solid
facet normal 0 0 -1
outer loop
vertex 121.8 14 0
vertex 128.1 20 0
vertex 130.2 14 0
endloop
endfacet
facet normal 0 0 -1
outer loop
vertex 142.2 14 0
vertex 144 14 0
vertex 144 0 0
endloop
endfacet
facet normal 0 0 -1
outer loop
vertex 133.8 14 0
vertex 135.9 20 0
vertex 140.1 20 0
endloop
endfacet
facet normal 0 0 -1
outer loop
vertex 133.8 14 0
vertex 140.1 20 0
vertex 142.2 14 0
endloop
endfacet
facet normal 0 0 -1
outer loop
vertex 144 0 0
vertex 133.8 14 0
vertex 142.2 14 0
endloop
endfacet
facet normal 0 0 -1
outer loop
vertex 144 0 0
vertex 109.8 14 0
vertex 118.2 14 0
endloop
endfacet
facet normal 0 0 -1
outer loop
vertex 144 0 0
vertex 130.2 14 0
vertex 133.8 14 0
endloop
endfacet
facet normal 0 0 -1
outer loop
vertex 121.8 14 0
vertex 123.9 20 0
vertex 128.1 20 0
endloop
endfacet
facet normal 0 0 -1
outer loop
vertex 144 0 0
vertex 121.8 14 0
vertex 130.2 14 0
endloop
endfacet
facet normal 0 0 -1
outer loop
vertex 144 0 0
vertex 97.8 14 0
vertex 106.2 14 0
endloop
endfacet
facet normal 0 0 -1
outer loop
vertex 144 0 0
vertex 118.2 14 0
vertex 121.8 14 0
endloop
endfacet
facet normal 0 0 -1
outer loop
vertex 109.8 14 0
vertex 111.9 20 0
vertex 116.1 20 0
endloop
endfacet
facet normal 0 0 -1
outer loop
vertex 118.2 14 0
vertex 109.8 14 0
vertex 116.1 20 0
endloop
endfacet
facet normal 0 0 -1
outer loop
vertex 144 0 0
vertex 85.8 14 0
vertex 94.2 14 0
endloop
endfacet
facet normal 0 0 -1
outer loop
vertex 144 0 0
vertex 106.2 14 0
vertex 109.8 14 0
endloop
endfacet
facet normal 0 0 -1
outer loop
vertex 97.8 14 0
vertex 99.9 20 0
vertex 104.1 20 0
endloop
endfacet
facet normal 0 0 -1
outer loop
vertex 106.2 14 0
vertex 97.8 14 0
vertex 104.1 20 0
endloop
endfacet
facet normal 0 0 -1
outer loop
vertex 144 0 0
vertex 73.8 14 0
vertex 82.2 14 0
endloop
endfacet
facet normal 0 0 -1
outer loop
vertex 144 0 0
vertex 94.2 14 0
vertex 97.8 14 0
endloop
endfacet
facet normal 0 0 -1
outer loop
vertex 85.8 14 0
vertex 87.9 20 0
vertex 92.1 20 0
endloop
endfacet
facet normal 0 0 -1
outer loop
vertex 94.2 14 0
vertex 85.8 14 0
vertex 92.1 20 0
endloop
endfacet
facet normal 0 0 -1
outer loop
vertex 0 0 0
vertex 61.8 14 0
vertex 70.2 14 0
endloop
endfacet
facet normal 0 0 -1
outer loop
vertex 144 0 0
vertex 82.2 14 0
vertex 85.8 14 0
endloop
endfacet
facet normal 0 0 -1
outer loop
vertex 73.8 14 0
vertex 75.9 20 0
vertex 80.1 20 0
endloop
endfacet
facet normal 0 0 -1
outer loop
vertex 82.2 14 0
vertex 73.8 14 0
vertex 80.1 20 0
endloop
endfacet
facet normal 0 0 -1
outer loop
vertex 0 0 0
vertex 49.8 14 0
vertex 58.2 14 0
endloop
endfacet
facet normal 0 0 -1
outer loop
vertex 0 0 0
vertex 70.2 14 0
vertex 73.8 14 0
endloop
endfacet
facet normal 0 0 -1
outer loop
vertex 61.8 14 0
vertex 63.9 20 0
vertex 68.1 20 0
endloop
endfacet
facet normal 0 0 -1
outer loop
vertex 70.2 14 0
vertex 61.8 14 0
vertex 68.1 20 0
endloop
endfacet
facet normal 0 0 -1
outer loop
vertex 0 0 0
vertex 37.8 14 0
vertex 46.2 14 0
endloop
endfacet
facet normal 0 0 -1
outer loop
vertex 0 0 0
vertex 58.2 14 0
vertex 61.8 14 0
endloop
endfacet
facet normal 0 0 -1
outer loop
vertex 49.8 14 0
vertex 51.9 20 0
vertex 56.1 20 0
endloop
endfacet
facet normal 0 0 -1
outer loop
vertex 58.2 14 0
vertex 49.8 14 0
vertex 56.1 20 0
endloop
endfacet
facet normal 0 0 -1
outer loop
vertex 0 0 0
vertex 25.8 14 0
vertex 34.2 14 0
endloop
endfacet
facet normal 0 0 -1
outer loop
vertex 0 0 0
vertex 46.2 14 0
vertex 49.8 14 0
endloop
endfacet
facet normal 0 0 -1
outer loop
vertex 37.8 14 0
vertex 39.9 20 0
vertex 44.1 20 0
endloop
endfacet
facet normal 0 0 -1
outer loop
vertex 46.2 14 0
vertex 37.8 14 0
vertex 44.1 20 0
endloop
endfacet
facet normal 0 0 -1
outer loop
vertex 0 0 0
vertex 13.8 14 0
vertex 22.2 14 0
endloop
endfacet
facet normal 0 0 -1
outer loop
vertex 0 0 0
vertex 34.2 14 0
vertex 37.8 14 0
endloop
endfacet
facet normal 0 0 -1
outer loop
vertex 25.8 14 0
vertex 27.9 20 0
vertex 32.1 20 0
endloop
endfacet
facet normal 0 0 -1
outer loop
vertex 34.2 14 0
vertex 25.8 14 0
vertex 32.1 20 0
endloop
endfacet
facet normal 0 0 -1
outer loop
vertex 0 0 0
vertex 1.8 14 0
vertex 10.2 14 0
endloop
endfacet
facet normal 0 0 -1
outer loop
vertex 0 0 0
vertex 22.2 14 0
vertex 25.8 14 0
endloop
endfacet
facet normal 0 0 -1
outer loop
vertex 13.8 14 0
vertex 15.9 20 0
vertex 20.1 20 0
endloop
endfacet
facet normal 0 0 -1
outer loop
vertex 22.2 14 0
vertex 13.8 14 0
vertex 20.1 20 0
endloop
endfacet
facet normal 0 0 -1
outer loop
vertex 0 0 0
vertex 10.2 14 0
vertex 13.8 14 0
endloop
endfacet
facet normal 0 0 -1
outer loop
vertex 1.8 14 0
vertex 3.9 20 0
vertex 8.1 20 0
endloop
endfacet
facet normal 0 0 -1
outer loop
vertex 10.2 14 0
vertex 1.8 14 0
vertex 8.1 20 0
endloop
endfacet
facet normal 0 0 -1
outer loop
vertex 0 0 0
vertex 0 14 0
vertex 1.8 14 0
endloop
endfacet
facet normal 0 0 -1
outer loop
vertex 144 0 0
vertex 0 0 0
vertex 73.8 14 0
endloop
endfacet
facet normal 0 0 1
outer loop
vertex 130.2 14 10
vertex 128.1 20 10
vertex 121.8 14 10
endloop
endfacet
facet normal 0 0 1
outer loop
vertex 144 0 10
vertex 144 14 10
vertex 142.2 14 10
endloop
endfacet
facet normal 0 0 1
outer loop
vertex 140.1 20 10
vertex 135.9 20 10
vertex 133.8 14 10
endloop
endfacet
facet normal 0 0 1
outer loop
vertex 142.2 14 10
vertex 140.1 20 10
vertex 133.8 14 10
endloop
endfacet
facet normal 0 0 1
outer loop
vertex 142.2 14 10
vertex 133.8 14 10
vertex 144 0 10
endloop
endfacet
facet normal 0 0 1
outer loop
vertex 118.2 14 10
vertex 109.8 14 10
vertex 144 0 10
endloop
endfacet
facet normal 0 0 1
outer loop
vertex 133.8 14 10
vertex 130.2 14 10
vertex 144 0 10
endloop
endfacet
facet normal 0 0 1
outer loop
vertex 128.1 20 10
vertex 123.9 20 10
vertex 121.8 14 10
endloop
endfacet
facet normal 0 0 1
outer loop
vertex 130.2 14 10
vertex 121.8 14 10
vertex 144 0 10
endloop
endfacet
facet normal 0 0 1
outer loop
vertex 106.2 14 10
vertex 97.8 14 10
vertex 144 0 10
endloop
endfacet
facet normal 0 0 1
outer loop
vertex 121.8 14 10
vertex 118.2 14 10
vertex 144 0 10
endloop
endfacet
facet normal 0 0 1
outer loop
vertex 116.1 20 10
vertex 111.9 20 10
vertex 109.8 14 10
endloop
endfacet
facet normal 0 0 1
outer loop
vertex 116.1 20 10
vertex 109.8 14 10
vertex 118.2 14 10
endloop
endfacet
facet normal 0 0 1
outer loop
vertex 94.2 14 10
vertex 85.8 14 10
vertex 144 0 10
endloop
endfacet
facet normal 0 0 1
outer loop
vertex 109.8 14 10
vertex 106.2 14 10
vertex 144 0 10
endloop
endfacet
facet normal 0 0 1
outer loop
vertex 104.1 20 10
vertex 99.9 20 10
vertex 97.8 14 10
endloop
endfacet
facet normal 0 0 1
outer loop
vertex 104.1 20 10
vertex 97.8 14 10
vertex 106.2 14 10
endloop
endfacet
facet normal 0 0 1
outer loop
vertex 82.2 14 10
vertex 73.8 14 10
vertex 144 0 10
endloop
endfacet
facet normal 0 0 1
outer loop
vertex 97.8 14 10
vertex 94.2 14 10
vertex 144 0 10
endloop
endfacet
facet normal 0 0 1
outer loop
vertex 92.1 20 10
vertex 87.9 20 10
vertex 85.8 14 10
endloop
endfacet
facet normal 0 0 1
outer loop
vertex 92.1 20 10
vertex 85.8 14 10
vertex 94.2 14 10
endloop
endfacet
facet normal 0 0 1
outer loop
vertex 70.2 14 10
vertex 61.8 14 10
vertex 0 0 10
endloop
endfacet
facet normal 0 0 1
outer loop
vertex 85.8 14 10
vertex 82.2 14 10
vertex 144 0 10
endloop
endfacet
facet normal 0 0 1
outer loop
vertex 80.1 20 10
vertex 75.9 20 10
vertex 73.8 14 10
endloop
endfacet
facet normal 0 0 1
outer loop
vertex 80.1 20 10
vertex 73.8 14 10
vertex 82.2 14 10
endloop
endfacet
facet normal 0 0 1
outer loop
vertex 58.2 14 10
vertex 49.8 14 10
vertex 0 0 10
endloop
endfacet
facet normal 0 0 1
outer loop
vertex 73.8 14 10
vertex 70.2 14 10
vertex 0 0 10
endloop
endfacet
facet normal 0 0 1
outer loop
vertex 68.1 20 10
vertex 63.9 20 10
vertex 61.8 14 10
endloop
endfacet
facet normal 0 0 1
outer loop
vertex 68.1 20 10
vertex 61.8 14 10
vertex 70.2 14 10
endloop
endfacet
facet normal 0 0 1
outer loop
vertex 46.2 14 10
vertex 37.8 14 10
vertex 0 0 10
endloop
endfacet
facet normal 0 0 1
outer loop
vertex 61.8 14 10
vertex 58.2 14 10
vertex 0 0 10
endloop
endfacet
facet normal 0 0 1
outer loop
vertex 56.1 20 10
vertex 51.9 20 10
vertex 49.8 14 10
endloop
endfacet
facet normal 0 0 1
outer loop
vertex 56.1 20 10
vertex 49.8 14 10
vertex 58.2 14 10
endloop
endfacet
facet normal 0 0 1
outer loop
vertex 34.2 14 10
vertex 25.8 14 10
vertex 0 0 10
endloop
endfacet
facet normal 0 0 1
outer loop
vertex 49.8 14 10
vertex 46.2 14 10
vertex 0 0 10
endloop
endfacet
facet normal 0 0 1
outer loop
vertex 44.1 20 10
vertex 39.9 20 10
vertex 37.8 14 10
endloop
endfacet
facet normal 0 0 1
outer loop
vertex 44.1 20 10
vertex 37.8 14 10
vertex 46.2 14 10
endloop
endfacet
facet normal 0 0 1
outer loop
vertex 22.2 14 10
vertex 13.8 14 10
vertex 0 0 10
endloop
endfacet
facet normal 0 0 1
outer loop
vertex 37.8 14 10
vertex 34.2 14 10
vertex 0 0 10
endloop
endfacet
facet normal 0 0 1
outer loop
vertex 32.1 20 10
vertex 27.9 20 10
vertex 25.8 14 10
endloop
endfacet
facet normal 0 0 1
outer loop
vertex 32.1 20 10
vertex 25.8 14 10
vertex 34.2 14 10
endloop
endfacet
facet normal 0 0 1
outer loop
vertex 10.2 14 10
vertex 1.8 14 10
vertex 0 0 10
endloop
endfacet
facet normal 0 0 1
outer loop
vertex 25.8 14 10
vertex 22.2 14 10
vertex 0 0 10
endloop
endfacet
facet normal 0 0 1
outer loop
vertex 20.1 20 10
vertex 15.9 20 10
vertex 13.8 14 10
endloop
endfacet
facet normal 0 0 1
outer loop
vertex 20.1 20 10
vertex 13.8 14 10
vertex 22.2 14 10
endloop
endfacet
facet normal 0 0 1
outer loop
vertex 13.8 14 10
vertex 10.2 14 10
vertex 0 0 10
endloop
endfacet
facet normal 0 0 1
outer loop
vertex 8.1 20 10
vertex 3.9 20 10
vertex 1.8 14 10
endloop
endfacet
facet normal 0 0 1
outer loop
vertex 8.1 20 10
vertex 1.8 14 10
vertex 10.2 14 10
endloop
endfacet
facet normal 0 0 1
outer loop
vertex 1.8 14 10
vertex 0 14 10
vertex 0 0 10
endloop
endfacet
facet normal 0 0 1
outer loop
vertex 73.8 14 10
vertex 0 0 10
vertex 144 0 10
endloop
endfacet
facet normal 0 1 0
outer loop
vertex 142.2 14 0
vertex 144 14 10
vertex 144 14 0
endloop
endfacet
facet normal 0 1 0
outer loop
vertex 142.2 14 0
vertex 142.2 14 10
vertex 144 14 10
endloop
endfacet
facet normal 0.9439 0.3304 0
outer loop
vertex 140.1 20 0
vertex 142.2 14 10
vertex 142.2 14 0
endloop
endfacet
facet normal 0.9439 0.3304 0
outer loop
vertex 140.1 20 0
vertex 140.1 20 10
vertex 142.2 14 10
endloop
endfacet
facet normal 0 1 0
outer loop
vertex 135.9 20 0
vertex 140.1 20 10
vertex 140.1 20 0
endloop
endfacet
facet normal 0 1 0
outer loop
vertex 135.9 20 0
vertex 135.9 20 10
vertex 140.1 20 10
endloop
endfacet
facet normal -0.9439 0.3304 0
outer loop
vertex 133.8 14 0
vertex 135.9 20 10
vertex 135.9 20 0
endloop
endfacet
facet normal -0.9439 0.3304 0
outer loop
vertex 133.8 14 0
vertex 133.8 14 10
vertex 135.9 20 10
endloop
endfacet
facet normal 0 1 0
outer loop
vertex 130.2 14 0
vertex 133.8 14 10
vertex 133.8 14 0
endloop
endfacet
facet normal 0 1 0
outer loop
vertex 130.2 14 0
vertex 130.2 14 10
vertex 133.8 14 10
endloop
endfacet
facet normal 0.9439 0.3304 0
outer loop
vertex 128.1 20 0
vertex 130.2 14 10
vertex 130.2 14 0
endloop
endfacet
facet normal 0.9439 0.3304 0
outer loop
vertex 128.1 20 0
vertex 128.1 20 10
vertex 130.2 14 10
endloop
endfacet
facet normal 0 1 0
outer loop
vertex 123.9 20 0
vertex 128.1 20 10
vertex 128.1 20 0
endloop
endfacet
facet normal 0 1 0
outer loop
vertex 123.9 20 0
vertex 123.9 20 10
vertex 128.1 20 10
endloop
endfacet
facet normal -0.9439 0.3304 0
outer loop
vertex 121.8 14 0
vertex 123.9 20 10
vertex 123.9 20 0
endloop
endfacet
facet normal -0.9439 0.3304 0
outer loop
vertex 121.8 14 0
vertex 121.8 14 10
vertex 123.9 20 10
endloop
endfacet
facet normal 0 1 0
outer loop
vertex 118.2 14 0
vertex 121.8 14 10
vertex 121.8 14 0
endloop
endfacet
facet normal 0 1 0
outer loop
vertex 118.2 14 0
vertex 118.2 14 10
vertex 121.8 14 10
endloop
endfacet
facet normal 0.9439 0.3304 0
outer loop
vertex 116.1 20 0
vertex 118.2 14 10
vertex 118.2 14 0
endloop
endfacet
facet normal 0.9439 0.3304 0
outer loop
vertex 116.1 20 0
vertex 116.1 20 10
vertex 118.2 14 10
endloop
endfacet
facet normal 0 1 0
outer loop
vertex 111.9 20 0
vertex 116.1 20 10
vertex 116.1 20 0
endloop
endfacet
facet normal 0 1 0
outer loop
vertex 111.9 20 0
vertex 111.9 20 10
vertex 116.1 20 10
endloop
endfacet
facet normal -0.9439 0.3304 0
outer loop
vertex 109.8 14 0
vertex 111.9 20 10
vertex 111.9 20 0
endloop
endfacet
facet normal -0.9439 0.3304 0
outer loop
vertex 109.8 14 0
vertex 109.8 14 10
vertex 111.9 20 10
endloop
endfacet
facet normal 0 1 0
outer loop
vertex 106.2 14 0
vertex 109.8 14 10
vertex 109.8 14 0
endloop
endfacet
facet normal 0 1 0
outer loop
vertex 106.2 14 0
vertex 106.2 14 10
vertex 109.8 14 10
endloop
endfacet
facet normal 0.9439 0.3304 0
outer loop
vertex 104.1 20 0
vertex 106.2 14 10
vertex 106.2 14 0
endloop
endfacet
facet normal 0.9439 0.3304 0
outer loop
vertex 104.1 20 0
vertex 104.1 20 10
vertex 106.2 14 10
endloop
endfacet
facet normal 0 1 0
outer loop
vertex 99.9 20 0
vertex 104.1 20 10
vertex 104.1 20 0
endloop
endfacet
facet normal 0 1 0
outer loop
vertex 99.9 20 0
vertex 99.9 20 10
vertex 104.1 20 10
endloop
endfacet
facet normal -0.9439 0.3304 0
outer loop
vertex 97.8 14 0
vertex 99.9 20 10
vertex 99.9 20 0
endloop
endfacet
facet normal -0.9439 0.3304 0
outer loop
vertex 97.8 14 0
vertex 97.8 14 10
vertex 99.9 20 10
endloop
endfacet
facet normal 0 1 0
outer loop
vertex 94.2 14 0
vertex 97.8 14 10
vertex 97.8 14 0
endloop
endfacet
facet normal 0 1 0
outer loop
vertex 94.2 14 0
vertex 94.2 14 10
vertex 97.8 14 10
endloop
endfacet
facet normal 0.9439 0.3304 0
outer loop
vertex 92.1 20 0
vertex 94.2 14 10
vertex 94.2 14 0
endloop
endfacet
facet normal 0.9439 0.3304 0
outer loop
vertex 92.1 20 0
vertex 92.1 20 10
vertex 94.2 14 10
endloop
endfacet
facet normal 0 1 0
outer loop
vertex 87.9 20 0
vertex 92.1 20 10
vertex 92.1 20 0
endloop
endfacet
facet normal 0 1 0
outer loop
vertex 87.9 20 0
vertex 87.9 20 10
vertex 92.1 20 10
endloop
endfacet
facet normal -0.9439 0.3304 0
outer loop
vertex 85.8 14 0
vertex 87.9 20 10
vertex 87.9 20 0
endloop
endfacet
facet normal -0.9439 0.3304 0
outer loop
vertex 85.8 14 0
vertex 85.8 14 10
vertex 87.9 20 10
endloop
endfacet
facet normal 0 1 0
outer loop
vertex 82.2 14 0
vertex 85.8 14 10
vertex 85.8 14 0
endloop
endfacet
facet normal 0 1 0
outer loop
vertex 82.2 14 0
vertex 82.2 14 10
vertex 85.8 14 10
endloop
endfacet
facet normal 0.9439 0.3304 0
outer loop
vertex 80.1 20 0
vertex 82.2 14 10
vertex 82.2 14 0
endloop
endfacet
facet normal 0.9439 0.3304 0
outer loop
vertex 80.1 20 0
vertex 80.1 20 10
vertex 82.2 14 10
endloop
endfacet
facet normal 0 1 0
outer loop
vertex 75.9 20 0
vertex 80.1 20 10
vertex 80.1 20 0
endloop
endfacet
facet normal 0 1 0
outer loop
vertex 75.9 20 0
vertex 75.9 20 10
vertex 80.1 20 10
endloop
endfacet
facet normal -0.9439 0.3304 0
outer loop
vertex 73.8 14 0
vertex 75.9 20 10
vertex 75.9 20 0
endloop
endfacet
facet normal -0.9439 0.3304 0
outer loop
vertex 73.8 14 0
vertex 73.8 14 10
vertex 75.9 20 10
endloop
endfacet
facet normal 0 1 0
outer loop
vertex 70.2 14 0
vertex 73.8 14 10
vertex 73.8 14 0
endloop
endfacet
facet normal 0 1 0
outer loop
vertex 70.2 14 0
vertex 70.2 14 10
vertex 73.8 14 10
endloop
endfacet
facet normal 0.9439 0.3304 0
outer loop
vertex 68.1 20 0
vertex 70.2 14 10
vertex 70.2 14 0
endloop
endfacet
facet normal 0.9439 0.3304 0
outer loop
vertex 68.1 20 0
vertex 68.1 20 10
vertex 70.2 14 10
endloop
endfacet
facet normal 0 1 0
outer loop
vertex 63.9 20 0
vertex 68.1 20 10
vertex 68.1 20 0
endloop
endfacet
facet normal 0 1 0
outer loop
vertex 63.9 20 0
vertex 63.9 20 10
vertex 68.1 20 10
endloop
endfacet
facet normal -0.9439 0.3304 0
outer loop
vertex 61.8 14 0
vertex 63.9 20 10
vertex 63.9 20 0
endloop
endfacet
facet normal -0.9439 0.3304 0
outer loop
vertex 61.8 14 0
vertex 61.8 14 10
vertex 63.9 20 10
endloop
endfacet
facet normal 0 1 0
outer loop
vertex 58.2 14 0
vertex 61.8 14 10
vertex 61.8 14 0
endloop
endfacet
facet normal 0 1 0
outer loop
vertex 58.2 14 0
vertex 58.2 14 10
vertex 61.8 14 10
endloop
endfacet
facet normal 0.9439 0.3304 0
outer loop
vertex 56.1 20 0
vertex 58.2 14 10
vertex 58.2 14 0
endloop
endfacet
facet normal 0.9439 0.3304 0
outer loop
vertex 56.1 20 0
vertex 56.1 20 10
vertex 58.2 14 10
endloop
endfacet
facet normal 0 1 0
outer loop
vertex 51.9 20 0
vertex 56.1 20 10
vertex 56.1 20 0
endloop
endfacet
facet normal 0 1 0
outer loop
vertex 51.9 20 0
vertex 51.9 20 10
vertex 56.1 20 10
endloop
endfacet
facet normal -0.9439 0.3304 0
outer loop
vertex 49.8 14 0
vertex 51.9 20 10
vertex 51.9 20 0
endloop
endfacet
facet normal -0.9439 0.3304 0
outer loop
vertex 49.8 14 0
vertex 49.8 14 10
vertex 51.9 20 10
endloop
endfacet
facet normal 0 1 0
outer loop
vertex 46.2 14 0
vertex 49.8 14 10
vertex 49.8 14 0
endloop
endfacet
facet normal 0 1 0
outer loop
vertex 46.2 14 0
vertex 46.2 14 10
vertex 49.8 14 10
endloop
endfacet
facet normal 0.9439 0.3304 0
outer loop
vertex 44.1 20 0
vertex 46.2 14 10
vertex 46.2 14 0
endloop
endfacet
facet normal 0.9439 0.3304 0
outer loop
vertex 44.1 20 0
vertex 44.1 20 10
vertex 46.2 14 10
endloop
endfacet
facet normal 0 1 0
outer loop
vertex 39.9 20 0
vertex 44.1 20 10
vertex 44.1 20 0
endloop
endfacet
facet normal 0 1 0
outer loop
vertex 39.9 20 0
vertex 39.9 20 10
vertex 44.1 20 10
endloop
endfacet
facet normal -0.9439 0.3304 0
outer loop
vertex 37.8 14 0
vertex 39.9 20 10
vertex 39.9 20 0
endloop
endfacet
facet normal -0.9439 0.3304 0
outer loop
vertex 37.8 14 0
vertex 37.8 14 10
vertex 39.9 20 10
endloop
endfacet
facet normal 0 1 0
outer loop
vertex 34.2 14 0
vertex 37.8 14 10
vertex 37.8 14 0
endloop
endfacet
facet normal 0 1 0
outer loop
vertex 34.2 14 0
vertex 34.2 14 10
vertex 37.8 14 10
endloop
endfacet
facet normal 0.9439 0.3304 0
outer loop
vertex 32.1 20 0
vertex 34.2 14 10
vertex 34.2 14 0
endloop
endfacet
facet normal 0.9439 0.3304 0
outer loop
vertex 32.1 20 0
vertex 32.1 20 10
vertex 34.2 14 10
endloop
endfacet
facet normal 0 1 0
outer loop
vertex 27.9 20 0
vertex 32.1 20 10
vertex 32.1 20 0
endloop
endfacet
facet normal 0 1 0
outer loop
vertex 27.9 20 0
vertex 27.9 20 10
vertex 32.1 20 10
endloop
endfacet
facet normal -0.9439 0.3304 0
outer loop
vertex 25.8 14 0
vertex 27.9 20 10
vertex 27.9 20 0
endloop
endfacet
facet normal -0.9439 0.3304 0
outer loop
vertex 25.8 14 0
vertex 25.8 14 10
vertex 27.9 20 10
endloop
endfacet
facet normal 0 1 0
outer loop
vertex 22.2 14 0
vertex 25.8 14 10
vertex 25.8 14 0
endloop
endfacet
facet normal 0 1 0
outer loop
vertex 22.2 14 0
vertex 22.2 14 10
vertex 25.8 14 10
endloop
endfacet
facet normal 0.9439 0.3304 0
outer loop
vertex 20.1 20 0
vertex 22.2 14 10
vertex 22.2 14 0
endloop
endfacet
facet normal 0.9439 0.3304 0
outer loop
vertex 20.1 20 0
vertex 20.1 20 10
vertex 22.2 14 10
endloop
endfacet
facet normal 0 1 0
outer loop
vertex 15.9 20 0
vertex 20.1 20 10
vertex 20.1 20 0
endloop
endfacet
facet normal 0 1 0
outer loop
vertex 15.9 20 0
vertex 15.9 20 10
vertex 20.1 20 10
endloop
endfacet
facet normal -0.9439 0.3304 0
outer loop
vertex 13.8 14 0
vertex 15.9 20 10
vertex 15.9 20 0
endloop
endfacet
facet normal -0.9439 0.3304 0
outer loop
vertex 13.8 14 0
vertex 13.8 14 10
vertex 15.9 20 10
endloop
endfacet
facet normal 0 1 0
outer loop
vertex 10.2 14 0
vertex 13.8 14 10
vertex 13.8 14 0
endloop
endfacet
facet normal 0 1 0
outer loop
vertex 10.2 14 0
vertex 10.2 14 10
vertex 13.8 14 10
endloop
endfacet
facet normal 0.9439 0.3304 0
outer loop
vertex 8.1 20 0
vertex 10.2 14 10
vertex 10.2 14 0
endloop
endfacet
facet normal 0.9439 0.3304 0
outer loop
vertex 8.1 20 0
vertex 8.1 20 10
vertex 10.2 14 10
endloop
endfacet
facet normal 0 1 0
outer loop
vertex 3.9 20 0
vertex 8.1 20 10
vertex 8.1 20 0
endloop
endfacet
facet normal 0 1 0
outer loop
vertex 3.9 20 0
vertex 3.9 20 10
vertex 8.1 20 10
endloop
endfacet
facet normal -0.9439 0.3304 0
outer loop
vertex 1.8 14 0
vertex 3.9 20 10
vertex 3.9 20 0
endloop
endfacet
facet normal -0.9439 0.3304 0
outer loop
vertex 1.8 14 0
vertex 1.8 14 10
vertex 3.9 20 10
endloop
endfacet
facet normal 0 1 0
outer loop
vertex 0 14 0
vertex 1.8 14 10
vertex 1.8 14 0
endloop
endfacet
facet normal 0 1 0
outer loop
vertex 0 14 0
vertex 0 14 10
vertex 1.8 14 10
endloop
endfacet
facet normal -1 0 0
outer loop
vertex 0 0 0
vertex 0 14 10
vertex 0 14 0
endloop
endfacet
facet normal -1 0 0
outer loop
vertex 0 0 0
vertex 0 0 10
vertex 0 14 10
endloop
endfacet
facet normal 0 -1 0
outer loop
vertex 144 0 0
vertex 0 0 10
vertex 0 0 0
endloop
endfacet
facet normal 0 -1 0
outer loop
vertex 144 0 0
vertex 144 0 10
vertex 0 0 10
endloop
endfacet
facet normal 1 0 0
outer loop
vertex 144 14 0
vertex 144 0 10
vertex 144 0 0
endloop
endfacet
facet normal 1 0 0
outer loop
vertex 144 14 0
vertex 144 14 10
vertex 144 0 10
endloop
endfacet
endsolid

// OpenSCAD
$fn = 32;

// ----------------------------------------------------------------------
// Gear rack: 12 teeth, pitch 12 mm
// ----------------------------------------------------------------------

// --- parameters (mm) ---
teeth = 12;               // number of teeth
pitch = 12;               // tooth pitch, X
root_w = 8.4;             // tooth width at the root
tip_w = 4.2;              // tooth width at the tip
base_h = 14;              // rack body height, Y
tooth_h = 6;              // tooth height above the body
plate_t = 10;             // rack width, Z (extrusion height)

rack_l = teeth * pitch;  // overall length
total_h = base_h + tooth_h;  // overall height

profile = [[0, 0], [144, 0], [144, 14], [142.2, 14], [140.1, 20], [135.9, 20], [133.8, 14], [130.2, 14], [128.1, 20], [123.9, 20], [121.8, 14], [118.2, 14], [116.1, 20], [111.9, 20], [109.8, 14], [106.2, 14], [104.1, 20], [99.9, 20], [97.8, 14], [94.2, 14], [92.1, 20], [87.9, 20], [85.8, 14], [82.2, 14], [80.1, 20], [75.9, 20], [73.8, 14], [70.2, 14], [68.1, 20], [63.9, 20], [61.8, 14], [58.2, 14], [56.1, 20], [51.9, 20], [49.8, 14], [46.2, 14], [44.1, 20], [39.9, 20], [37.8, 14], [34.2, 14], [32.1, 20], [27.9, 20], [25.8, 14], [22.2, 14], [20.1, 20], [15.9, 20], [13.8, 14], [10.2, 14], [8.1, 20], [3.9, 20], [1.8, 14], [0, 14]];  // primary outline, 52 points, counter clockwise

// --- the one profile operation ---
linear_extrude(height = plate_t) polygon(points = profile);
